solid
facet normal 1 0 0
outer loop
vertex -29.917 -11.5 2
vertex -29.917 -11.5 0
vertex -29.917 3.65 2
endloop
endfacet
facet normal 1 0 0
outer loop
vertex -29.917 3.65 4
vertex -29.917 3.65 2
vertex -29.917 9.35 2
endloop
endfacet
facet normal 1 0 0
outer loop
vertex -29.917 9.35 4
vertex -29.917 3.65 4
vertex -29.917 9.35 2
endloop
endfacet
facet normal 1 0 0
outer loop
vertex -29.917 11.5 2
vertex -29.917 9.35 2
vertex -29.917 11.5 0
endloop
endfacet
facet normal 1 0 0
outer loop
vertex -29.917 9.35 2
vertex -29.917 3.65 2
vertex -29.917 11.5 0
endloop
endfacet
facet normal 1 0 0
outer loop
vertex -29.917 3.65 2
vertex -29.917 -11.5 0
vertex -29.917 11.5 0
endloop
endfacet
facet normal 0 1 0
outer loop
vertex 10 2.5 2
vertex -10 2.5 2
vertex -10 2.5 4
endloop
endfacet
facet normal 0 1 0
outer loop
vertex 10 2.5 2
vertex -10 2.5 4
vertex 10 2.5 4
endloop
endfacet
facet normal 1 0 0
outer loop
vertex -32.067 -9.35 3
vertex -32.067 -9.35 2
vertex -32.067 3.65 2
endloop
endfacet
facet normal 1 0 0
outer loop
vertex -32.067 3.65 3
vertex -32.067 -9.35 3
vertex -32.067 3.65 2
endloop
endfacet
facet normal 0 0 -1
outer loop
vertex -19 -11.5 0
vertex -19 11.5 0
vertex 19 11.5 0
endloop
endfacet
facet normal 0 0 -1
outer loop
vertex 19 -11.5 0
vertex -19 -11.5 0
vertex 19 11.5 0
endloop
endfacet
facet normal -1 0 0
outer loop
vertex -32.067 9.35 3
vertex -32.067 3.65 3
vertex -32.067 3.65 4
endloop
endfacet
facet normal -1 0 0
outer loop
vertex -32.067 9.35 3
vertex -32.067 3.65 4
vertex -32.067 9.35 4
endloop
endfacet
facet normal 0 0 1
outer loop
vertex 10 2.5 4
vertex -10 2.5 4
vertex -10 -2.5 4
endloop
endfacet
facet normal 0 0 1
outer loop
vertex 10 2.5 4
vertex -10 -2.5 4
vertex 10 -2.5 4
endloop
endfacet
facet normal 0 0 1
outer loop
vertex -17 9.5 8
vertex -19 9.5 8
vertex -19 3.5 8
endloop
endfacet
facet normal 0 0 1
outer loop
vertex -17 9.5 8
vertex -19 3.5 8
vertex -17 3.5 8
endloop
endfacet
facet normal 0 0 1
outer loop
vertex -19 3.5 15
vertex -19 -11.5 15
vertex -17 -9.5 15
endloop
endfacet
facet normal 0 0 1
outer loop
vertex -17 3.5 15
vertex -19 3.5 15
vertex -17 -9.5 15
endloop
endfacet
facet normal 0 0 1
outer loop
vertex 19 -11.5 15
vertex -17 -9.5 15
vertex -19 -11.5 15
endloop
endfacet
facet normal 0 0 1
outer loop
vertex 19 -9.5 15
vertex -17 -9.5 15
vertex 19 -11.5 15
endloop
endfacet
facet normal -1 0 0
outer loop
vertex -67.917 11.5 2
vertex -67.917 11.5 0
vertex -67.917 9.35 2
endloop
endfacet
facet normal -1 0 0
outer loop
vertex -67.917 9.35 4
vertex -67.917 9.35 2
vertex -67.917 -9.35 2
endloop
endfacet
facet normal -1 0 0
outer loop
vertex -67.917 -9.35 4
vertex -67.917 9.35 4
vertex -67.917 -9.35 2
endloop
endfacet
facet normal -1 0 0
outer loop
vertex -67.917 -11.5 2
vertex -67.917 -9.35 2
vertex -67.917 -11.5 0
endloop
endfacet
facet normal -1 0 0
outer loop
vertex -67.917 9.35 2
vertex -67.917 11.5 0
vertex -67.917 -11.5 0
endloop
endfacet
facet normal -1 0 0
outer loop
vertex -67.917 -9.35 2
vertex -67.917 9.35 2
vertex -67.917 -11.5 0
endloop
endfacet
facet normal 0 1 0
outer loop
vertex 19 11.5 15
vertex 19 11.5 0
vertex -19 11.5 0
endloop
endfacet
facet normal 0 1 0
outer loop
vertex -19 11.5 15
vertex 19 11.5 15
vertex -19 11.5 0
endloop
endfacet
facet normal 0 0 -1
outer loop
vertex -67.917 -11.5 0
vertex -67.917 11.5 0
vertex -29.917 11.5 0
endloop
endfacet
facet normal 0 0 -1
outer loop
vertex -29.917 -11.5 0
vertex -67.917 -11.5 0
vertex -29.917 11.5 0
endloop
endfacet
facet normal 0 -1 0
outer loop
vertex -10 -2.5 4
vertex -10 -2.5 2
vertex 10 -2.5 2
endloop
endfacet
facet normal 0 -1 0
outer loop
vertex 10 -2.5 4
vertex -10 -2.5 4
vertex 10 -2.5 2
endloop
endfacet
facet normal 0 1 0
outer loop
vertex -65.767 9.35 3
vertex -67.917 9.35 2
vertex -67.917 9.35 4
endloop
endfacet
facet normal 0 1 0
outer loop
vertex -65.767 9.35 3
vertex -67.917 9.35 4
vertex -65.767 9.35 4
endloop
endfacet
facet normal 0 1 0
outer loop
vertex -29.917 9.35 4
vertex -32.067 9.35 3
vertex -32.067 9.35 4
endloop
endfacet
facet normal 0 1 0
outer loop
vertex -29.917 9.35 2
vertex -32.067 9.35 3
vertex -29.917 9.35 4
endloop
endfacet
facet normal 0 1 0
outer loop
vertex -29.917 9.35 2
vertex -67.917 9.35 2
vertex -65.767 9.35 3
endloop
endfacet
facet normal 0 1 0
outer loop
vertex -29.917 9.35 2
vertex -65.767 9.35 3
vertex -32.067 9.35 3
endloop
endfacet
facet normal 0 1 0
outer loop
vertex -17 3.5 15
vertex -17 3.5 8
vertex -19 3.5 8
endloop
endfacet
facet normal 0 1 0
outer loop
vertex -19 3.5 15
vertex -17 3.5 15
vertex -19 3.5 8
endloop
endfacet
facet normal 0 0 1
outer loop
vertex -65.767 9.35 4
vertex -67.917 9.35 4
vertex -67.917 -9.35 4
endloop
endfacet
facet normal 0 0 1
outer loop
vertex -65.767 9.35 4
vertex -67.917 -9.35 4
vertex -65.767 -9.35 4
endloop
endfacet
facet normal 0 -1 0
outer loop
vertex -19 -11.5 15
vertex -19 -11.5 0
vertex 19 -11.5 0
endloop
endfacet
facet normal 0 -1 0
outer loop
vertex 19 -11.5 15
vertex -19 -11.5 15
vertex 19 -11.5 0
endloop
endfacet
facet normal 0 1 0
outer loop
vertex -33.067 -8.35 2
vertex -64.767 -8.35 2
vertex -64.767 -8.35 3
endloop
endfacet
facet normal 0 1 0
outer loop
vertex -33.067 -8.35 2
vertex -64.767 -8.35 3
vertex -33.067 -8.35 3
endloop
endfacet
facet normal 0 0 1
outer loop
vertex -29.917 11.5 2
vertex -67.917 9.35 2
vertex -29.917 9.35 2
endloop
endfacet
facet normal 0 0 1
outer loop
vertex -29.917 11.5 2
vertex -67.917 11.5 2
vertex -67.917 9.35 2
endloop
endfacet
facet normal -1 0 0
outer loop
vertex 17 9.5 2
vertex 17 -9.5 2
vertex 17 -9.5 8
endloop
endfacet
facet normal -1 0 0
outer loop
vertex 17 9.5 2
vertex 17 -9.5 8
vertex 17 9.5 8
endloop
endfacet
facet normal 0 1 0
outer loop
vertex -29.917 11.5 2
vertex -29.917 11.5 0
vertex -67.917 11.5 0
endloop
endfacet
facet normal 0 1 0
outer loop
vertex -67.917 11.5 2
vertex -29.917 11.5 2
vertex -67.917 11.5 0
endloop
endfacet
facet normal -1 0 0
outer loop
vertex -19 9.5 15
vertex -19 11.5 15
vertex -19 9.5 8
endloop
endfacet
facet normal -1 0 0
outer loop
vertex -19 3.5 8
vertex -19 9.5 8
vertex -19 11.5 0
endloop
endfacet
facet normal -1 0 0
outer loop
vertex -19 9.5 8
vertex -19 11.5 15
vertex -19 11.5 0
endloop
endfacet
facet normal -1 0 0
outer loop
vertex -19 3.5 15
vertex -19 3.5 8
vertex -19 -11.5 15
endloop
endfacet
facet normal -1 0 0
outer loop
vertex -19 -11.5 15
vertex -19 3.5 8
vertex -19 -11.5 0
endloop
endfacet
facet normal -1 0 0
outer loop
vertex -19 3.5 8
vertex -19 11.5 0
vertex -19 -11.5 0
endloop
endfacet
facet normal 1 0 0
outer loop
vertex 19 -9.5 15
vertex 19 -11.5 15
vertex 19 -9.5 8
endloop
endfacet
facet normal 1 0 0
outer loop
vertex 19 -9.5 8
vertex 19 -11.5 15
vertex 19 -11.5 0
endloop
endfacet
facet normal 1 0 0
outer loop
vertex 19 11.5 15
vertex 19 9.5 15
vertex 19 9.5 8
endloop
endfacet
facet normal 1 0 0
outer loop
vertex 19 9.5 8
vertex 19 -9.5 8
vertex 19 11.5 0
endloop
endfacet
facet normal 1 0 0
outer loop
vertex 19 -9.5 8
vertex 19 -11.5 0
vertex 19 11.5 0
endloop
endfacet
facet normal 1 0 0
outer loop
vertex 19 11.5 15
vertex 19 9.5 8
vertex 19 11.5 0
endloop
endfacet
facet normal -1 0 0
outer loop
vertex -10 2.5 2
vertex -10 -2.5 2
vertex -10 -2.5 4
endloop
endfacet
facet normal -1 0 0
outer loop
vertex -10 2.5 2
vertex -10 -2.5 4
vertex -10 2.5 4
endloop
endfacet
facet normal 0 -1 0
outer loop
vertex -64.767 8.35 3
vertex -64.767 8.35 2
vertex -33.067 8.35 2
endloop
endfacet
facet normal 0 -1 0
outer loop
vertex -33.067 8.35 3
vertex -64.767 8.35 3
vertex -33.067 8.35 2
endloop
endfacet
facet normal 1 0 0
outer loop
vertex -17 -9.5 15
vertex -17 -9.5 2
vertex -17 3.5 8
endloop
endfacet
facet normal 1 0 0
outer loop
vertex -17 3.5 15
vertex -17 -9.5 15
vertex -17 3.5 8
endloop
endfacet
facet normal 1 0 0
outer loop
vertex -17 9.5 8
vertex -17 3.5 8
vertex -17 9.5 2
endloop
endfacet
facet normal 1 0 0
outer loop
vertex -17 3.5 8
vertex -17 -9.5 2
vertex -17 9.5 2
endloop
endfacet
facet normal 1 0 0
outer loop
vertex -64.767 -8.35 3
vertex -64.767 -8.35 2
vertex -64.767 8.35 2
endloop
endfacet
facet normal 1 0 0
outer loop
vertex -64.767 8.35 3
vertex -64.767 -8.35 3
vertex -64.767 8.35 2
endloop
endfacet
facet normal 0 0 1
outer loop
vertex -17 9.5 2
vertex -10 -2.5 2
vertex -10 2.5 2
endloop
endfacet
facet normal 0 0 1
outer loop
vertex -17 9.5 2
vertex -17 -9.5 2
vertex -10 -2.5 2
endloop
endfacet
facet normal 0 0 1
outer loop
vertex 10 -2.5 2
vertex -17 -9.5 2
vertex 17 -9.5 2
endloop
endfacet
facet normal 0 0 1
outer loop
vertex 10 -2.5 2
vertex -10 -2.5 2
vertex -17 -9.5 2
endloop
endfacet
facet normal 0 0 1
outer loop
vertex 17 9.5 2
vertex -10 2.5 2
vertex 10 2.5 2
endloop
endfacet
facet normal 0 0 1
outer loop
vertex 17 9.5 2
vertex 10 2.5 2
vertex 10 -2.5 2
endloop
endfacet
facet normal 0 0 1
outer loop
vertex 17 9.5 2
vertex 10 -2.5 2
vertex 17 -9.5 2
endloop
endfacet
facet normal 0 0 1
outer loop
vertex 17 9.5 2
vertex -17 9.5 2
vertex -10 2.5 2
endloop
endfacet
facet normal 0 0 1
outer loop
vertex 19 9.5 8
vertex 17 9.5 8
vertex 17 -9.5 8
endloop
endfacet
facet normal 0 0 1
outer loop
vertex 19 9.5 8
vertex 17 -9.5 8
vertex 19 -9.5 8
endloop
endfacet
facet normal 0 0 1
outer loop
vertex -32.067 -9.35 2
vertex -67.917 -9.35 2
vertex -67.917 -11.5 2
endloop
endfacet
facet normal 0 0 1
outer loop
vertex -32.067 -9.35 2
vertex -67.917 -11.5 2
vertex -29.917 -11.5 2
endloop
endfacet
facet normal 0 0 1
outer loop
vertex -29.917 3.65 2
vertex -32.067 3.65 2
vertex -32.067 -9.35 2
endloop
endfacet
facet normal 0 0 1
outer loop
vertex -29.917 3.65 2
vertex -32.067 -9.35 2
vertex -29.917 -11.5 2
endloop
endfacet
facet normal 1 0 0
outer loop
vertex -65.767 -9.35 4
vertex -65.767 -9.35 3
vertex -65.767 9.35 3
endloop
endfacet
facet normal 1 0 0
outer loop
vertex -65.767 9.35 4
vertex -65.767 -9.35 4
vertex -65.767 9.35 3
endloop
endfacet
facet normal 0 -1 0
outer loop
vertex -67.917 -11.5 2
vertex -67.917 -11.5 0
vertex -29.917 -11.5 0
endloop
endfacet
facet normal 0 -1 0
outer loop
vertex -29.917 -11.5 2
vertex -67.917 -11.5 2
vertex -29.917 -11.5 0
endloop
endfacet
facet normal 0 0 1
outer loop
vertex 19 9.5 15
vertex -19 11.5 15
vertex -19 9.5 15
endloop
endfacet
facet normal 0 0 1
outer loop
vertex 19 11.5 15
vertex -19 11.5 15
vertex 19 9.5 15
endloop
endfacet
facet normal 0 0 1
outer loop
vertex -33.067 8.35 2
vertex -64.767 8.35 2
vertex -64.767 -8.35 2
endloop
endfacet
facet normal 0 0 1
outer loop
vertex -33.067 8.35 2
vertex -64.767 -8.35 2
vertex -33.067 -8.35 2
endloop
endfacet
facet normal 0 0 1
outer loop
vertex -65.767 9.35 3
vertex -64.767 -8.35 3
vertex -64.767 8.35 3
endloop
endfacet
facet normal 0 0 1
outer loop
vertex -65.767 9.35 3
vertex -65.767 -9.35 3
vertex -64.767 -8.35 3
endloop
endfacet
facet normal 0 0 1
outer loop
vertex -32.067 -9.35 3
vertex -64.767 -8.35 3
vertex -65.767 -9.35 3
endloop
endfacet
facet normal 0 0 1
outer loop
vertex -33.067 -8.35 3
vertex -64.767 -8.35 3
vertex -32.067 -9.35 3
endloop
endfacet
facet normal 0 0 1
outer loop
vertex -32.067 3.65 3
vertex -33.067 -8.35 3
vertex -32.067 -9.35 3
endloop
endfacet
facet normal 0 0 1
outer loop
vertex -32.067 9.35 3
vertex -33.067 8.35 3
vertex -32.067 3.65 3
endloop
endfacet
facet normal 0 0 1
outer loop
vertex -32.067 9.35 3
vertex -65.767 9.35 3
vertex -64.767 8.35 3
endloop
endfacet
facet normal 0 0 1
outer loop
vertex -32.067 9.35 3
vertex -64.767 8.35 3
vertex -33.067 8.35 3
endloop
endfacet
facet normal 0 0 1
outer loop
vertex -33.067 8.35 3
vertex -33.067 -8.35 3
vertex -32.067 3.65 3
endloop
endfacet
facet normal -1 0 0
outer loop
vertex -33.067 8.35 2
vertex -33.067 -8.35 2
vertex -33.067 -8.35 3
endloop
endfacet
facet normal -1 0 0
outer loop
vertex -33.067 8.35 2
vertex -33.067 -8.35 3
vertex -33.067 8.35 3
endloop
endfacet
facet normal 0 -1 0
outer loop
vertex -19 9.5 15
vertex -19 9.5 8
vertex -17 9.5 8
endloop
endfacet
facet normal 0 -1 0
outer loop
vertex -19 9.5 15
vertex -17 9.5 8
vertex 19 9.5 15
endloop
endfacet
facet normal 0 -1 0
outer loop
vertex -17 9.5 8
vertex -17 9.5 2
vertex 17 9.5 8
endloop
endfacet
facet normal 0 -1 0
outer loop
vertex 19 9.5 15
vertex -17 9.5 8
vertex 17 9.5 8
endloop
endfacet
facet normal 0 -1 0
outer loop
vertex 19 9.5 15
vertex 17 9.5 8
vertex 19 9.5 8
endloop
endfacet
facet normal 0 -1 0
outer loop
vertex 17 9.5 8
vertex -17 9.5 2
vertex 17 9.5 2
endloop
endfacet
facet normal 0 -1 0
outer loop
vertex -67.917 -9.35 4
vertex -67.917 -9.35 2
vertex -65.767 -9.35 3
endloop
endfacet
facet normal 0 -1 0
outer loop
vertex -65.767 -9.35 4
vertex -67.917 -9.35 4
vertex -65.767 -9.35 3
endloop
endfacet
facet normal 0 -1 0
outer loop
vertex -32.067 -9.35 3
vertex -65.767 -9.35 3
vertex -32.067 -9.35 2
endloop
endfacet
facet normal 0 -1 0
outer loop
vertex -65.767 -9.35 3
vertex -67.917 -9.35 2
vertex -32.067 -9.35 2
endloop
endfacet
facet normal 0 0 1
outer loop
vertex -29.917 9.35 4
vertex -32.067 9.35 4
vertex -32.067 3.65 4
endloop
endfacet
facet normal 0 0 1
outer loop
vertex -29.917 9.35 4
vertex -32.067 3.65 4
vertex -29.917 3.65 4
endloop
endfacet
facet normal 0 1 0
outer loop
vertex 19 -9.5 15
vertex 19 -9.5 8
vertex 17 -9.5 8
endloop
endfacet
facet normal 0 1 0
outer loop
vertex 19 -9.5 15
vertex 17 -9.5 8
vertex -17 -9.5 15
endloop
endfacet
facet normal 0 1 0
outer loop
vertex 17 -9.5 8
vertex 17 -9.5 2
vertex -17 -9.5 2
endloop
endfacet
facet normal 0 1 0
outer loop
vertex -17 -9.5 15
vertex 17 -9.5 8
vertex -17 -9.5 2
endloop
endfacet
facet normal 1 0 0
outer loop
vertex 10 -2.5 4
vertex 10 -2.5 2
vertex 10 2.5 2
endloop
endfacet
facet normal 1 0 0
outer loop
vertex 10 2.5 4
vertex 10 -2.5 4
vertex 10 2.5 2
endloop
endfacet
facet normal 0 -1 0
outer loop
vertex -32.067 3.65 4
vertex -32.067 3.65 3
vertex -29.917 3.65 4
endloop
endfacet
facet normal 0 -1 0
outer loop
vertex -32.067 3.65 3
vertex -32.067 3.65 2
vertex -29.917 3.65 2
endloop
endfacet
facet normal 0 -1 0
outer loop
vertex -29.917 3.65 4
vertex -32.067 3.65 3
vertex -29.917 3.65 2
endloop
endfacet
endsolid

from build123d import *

# Parameters (mm, degrees)
F0_W     = 20
F0_H     = 5
F1_DEPTH = 2
F2_DEPTH = 4
F3_DEPTH = 15
F0_W_2   = 2
F0_H_2   = 19
F0_H_3   = 6
F4_DEPTH = 8
F5_W     = 2.15
F5_H     = 13
F5_W_2   = 31.7
F5_H_2   = 16.7
F6_DEPTH = 2
F7_DEPTH = 3
F5_H_3   = 5.7
F5_H_4   = 18.7
F8_DEPTH = 4


with BuildPart() as f1:
    # F0 (on Top) → F1 (new body)
    with BuildSketch(Plane.XY):
        Polygon((-17, -9.5), (17, -9.5), (17, 9.5), (-17, 9.5), (-17, 3.5), align=None)
        Rectangle(F0_W, F0_H, mode=Mode.SUBTRACT)
    extrude(amount=F1_DEPTH)

    # F0 (on Top) → F2 (join)
    with BuildSketch(Plane.XY):
        Rectangle(F0_W, F0_H)
    extrude(amount=F2_DEPTH)

    # F0 (on Top) → F3 (join)
    with BuildSketch(Plane.XY):
        Polygon((19, -9.5), (17, -9.5), (-17, -9.5), (-17, 3.5), (-19, 3.5), (-19, -11.5), (19, -11.5), align=None)
        Polygon((-17, 9.5), (17, 9.5), (19, 9.5), (19, 11.5), (-19, 11.5), (-19, 9.5), align=None)
    extrude(amount=F3_DEPTH)

    # F0 (on Top) → F4 (join)
    with BuildSketch(Plane.XY):
        with Locations((18, 0)):
            Rectangle(F0_W_2, F0_H_2)
        with Locations((-18, 6.5)):
            Rectangle(F0_W_2, F0_H_3)
    extrude(amount=F4_DEPTH)


with BuildPart() as f6:
    # F5 (on Top) → F6 (new body)
    with BuildSketch(Plane.XY):
        Polygon((-67.916532, 9.35), (-65.766532, 9.35), (-32.066532, 9.35), (-29.916532, 9.35), (-29.916532, 11.5), (-67.916532, 11.5), align=None)
        Polygon((-29.916532, -9.35), (-32.066532, -9.35), (-65.766532, -9.35), (-67.916532, -9.35), (-67.916532, -11.5), (-29.916532, -11.5), align=None)
        with Locations((-30.991532, -2.85)):
            Rectangle(F5_W, F5_H)
        with Locations((-48.916532, 0)):
            Rectangle(F5_W_2, F5_H_2)
    extrude(amount=F6_DEPTH)

    # F5 (on Top) → F7 (join)
    with BuildSketch(Plane.XY):
        Polygon((-65.766532, -9.35), (-32.066532, -9.35), (-32.066532, 3.65), (-32.066532, 9.35), (-65.766532, 9.35), align=None)
        with Locations((-48.916532, 0)):
            Rectangle(F5_W_2, F5_H_2, mode=Mode.SUBTRACT)
    extrude(amount=F7_DEPTH)

    # F5 (on Top) → F8 (join)
    with BuildSketch(Plane.XY):
        with Locations((-30.991532, 6.5)):
            Rectangle(F5_W, F5_H_3)
        with Locations((-66.841532, 0)):
            Rectangle(F5_W, F5_H_4)
    extrude(amount=F8_DEPTH)


solid = Compound([f1.part, f6.part])
